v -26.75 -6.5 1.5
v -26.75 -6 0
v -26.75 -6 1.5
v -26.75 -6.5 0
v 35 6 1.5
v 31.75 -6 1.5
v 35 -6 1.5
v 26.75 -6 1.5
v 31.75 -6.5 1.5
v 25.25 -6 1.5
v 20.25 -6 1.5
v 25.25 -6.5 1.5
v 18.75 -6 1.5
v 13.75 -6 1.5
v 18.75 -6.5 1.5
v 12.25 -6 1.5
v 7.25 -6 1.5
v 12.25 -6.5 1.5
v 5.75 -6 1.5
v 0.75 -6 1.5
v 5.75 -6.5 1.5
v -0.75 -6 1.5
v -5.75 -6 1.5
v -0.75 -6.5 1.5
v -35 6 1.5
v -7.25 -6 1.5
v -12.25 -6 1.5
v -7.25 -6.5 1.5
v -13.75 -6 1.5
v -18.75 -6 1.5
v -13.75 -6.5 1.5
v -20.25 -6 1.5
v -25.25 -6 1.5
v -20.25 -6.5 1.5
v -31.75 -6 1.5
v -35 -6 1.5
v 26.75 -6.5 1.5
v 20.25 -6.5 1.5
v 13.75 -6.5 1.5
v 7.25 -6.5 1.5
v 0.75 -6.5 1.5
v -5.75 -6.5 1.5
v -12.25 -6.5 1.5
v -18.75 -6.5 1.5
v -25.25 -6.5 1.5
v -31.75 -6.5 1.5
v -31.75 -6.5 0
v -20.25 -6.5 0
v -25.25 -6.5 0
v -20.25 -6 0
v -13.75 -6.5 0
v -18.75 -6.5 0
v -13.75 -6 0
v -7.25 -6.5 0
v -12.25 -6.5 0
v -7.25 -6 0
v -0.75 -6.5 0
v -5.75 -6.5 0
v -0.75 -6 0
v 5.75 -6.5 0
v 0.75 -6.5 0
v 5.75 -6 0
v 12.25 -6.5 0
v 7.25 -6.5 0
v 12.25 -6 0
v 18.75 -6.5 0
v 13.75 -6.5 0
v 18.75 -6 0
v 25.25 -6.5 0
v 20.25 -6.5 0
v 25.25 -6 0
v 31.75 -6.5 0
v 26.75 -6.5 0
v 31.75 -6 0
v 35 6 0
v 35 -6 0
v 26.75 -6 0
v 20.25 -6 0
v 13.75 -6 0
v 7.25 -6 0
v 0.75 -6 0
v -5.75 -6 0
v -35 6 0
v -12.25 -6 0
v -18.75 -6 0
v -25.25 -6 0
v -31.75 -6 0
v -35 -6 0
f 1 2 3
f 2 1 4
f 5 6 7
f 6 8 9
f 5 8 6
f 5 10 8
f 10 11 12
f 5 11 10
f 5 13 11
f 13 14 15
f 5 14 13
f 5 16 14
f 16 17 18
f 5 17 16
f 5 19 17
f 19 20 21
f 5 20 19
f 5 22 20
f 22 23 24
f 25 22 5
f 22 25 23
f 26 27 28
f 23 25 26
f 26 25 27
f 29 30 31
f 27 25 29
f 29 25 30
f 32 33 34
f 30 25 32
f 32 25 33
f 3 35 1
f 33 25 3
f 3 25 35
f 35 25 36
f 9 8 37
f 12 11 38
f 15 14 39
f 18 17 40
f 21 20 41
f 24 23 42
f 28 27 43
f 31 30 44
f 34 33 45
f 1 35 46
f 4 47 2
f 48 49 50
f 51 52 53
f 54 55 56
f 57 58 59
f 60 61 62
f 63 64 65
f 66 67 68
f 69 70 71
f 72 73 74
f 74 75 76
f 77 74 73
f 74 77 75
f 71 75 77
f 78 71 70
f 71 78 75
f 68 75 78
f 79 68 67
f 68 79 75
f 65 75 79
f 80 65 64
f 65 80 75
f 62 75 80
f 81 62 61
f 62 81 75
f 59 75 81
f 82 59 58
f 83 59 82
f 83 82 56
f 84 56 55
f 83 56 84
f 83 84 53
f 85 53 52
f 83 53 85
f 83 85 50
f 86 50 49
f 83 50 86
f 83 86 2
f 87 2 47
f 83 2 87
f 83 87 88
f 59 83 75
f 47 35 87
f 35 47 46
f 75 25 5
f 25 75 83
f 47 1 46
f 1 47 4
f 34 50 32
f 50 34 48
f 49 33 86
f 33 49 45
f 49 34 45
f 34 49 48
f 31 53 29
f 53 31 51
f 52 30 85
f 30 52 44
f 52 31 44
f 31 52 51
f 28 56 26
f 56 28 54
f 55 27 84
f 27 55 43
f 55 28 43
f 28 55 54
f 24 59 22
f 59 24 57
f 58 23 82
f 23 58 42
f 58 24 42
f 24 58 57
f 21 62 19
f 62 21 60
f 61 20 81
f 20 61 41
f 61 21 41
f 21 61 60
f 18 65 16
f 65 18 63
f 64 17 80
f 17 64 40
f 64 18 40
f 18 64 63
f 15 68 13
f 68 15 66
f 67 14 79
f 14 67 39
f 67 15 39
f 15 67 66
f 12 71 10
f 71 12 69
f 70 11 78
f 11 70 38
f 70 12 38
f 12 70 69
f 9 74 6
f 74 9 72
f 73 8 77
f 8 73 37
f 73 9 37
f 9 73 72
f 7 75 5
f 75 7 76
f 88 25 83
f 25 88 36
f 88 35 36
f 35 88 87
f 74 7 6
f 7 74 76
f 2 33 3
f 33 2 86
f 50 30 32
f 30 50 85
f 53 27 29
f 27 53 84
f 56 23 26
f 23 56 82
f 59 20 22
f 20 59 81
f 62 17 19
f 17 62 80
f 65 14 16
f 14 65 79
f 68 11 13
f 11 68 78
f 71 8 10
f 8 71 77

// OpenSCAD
// 10-well comb for agarose gel casting
// Print orientation: flat on bed, teeth pointing down (-Y)

// ---- Dimensions (mm) ----
plate_t      = 1.5;   // plate thickness (Z)
spine_l      = 70;    // spine length (X)
spine_w      = 12;    // spine width (Y)
tooth_w      = 5.0;   // tooth width (X)
tooth_l      = 12;    // tooth length (Y)
tooth_count  = 10;    // number of teeth
gap          = 1.5;   // gap between teeth (X)
embed        = 0.5;   // tooth overlap into spine for a clean union

$fn = 64;

// ---- Derived ----
pitch   = tooth_w + gap;            // centre-to-centre spacing
x_start = -(tooth_count - 1) * pitch / 2;  // first tooth centre (row centred)

// ---- Model ----
union() {
    // Spine (back bar)
    translate([-spine_l / 2, -spine_w / 2, 0])
        cube([spine_l, spine_w, plate_t]);

    // Teeth hanging in -Y
    for (i = [0 : tooth_count - 1])
        translate([x_start + i * pitch - tooth_w / 2,
                   -spine_w / 2 - embed,
                   0])
            cube([tooth_w, tooth_l + embed, plate_t]);
}
